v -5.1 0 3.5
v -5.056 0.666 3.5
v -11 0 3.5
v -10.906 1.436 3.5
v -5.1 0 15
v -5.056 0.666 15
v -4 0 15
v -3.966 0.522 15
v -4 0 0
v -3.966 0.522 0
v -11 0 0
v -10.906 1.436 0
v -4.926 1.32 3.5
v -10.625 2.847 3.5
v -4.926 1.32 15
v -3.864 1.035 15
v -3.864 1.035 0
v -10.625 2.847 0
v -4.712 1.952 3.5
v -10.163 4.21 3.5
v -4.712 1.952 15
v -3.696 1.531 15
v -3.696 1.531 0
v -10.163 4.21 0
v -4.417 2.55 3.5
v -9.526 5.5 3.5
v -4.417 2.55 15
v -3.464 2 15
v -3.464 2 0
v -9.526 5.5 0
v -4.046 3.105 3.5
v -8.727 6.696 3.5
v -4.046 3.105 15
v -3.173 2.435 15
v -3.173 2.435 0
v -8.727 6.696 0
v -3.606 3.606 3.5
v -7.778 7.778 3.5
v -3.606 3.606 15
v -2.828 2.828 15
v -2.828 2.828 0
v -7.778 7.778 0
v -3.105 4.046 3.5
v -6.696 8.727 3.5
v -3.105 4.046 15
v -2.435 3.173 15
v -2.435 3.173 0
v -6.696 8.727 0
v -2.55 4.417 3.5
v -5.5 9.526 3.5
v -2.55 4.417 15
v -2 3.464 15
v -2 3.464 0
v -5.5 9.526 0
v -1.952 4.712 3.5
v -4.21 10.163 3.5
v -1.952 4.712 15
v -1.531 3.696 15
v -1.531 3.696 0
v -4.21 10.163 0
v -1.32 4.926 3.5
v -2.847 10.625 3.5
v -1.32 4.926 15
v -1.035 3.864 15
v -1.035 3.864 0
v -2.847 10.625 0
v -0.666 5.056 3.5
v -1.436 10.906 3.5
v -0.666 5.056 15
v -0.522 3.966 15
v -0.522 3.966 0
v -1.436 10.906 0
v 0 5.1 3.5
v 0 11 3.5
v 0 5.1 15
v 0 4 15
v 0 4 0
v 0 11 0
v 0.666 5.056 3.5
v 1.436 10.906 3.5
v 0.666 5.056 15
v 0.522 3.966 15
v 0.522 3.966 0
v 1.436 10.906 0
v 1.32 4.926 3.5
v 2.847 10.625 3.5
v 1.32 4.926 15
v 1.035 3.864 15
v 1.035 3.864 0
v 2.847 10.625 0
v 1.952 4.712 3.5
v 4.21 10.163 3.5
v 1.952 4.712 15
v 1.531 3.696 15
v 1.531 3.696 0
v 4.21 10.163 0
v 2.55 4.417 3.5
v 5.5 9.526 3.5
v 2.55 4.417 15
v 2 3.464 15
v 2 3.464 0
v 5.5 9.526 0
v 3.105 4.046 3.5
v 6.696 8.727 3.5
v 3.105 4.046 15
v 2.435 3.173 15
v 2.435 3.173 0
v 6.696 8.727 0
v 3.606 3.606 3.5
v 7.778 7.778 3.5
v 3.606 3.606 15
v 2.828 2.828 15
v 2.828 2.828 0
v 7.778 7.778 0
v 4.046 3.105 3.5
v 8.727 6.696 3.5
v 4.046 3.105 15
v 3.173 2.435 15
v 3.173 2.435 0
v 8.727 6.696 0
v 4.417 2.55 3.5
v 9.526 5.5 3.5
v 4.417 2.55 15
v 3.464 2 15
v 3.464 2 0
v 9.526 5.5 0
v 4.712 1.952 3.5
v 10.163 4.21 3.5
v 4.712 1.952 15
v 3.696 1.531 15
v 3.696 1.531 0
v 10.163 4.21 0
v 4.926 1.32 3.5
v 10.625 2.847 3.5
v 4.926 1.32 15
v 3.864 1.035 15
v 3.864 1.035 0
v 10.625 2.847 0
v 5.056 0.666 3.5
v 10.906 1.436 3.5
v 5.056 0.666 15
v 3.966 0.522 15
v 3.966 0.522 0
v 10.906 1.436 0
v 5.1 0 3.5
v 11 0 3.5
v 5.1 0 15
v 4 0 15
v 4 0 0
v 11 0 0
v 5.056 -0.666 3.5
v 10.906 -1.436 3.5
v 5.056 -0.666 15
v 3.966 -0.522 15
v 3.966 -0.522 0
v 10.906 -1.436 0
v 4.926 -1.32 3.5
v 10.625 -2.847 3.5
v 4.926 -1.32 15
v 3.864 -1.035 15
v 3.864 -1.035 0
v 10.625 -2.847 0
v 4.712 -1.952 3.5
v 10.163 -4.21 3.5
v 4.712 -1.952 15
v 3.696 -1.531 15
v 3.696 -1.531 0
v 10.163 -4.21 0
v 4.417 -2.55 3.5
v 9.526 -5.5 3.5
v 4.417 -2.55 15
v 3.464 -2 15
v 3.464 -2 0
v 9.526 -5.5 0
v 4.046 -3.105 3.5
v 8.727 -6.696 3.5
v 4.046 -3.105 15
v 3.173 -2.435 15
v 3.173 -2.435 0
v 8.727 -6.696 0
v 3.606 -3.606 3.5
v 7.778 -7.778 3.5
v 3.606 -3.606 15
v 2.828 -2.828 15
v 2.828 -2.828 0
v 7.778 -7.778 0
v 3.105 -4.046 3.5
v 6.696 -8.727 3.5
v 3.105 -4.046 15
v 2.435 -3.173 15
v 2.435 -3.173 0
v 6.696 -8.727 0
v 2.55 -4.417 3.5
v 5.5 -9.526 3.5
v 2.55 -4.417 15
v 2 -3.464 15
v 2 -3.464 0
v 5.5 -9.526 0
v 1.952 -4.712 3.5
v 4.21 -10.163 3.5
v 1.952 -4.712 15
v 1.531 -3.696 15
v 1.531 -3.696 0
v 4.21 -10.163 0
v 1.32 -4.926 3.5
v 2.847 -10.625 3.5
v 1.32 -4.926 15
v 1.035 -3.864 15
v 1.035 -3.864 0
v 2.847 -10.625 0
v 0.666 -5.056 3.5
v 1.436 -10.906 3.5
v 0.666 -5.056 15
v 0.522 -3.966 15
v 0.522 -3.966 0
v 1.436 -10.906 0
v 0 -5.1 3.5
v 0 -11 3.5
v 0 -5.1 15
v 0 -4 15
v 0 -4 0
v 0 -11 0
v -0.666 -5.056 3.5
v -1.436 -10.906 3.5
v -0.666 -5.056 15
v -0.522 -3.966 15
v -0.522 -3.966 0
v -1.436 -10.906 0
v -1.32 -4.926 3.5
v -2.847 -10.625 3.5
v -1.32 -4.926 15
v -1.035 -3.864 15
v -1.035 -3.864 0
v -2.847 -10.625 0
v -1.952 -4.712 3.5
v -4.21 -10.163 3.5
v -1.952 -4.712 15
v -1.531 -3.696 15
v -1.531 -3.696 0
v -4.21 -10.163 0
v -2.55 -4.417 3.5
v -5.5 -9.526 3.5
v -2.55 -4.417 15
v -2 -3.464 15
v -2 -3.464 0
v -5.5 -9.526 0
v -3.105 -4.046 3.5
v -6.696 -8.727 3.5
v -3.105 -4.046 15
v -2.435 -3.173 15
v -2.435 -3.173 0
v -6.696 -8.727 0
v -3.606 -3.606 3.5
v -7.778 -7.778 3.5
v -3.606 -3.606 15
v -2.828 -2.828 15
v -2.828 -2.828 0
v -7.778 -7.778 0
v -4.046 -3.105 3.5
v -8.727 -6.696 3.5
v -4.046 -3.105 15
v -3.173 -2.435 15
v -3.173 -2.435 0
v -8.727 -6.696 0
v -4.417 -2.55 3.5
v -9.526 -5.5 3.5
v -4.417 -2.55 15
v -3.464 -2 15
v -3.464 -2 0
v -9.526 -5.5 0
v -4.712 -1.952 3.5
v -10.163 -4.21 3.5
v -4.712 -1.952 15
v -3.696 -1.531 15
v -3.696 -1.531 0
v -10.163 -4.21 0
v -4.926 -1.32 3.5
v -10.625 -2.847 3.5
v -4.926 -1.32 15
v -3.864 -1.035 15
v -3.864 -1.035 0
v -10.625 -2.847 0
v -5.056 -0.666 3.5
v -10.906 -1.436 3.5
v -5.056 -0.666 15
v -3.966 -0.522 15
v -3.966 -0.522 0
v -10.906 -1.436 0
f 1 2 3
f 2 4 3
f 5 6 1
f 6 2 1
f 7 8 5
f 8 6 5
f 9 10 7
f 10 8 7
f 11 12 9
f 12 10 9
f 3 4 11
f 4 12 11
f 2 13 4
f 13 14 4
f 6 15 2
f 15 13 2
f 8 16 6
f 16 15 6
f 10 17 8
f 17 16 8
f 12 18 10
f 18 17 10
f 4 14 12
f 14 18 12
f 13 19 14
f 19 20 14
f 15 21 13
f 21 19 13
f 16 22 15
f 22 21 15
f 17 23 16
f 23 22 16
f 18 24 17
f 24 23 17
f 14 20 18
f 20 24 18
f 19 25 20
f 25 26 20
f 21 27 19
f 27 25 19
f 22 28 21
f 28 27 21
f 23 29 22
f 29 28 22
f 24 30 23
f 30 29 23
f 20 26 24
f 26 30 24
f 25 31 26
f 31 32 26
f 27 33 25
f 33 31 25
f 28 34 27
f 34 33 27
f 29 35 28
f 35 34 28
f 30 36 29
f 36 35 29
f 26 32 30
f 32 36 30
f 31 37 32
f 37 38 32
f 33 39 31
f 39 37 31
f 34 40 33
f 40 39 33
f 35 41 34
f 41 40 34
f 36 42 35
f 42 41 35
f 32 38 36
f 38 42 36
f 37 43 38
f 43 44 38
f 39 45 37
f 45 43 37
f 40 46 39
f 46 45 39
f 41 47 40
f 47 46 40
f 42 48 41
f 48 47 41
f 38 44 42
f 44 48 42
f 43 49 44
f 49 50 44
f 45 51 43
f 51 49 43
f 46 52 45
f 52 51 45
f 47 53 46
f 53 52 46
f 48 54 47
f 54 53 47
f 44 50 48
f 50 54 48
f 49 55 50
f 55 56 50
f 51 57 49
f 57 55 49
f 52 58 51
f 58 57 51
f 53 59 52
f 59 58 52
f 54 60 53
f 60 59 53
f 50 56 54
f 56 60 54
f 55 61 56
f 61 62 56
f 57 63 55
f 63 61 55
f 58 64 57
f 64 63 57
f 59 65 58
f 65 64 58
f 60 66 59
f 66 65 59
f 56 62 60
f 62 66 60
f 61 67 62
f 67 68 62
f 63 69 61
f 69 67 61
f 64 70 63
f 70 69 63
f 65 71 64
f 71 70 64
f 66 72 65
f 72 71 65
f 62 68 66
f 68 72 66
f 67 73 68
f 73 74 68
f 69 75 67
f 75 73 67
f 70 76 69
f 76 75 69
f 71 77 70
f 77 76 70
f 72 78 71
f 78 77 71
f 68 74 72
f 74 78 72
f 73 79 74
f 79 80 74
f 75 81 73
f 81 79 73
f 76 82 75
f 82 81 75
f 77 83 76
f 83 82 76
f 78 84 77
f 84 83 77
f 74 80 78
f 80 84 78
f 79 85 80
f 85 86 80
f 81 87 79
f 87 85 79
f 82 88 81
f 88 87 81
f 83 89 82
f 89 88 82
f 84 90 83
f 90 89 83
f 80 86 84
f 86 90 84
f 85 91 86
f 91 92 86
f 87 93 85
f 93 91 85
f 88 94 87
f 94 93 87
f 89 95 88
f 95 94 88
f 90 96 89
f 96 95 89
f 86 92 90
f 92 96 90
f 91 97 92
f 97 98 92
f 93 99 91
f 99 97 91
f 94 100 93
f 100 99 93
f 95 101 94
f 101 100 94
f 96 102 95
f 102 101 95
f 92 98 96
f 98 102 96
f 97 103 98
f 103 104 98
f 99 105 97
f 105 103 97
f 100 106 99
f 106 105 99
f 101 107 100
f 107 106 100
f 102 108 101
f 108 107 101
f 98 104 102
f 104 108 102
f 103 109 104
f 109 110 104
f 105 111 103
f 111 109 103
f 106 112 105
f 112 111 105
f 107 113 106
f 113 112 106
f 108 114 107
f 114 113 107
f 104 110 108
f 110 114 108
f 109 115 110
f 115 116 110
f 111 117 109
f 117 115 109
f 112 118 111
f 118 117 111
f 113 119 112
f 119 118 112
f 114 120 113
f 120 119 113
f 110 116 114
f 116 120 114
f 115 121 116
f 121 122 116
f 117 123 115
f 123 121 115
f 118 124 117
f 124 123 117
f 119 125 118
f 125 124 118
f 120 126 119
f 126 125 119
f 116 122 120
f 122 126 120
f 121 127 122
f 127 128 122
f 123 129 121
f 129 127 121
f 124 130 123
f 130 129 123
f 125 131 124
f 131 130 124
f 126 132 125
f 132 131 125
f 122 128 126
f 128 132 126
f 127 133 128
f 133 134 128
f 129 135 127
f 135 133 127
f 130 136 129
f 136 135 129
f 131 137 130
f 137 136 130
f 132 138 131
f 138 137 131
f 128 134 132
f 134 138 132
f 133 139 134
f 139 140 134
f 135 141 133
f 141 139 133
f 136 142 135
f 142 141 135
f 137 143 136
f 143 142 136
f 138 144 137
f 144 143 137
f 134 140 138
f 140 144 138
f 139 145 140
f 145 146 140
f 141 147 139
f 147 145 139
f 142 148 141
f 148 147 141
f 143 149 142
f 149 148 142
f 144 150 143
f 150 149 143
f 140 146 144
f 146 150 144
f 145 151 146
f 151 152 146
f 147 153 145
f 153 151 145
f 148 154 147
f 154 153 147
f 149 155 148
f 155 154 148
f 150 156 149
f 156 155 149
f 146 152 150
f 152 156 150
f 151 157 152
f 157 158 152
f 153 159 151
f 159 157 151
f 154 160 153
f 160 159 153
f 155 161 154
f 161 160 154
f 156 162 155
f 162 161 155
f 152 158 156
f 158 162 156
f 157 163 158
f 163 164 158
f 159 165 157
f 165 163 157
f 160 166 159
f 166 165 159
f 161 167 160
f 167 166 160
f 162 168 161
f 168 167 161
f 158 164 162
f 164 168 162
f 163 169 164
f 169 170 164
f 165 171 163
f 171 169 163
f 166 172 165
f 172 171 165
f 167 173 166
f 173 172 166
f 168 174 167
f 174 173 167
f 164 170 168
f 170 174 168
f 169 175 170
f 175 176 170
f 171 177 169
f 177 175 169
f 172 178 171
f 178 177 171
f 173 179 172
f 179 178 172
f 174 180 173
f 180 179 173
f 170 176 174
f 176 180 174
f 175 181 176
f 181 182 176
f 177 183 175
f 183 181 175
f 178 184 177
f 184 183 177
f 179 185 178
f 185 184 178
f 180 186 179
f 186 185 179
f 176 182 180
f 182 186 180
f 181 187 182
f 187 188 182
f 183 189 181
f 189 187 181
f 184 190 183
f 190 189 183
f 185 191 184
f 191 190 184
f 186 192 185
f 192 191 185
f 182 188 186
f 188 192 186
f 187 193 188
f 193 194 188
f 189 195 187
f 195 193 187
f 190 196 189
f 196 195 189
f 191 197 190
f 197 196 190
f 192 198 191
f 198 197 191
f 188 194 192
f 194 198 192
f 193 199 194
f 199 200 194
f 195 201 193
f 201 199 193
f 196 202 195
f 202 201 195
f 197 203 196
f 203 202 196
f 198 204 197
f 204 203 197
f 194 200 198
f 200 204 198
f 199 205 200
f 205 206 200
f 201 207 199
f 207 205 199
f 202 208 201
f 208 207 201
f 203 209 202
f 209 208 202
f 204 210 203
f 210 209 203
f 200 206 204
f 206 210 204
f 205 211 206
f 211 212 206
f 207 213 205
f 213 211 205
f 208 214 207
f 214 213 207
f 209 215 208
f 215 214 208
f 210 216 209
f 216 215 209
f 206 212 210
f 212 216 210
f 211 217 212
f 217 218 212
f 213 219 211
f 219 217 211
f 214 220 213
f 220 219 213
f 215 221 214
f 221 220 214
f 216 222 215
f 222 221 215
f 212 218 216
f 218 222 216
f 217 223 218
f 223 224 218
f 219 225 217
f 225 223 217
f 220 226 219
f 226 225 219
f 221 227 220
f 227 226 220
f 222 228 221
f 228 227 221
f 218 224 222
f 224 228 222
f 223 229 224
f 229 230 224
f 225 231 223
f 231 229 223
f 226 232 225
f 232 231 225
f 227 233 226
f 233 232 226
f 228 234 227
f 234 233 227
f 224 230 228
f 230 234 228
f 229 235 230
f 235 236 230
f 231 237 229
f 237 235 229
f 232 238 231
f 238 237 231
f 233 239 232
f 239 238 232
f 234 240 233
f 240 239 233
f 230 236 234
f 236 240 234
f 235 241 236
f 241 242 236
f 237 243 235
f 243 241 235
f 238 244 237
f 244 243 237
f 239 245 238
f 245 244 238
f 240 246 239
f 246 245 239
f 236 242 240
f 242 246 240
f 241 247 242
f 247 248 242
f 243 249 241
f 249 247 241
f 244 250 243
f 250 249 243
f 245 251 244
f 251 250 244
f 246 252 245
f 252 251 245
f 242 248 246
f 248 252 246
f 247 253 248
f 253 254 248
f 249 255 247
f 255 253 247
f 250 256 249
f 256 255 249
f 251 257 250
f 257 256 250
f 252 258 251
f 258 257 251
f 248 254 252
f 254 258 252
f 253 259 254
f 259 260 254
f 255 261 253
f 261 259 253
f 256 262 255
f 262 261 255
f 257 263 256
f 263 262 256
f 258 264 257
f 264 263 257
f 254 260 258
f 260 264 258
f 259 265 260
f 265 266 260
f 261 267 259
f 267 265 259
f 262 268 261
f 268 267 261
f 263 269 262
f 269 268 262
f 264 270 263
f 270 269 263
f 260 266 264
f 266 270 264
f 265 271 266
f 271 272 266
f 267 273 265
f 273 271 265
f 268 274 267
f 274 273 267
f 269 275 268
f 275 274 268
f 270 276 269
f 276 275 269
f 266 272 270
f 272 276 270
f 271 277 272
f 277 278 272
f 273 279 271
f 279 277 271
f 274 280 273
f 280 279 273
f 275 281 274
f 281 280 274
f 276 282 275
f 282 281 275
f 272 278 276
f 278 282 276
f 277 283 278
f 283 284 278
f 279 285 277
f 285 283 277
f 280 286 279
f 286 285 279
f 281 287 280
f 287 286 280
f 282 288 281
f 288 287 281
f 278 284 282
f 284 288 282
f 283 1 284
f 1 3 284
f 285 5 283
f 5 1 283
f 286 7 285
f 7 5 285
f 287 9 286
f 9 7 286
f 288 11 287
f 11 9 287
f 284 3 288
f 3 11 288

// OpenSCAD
// file: ../config.scad
// SCARA 로봇 공통 사양(specification) — 모든 부품 파일에서 include해 사용한다.

$fn = 48;

// ── 공차(tolerance) ──
print_clearance = 0.2;   // FDM 출력 끼워맞춤(fit) 여유 — 압입(press-fit) 자리 제외
eps             = 1/128; // 미세 겹침(epsilon) — 접하는 솔리드를 살짝 겹쳐 동일면(coincident face) z-파이팅 방지

// ── FDM 출력 사양(print specification) ──
fdm_layer_h       = 0.28;   // 레이어 높이(layer height) — 슬라이서(slicer) 설정값과 일치시킨다.
fdm_shoulder_layers = 6;   // 숄더(shoulder) 최소 레이어 수 — FDM 최소 구조 벽(0.4mm 노즐 3겹 ~1.2mm) 기준 하한값.

// ── 레이아웃(layout) ──
// layout_margin — 플레이트 위 부품 배치 공통 여백(margin). 부품 외곽선에서
// 사방으로 주는 값 → 부품끼리는 2*margin 이격, 외곽 가장자리도 margin 확보.
layout_margin = 4;

// ── 시트 형상(seat geometry) ──
// seat_shoulder_t — fdm_layer_h · fdm_shoulder_layers 파생. 슬라이서 설정 변경 시 자동 연동.
seat_shoulder_t = fdm_layer_h * fdm_shoulder_layers;
// main file
/*
 * lead_nuts.scad - 플랜지 리드넛(flanged lead nut) 기성품(vitamin)
 *
 * T8 리드스크루(lead screw)의 회전을 직선 이송(linear feed)으로 바꾸는
 * 황동(brass) 플랜지 리드넛 시각화용 모델(보어 T8 / 몸체 ⌀10.2 /
 * 플랜지 ⌀22 x 3.5 / 총높이 15).
 *
 * Z 브레이크포인트(Z breakpoint) 최적화: 리드넛은 회전 대칭(rotationally
 * symmetric)이라 플랜지(flange)·몸체(body)·보어(bore)를 동시에 그리는
 * 환형(annular) 단면 한 개의 단일 rotate_extrude로 만든다 — union·
 * difference 없음. (플랜지 볼트홀(bolt hole)은 단일 회전체 유지를 위해
 * 생략한다.)
 *
 * 좌표계: 축(axis) = Z, 플랜지 바닥(flange base) = z=0.
 */

include <../config.scad>

/* --- 색상(cosmetic) --- */
c_brass		= [0.78, 0.62, 0.32];	/* 황동(brass) */

/*
 * 플랜지 리드넛 — bore_d(보어) x body_d(몸체) x flange_d(플랜지) x
 * flange_t(플랜지 두께) x height(총 높이). 플랜지 바닥(z=0)에서 시작해
 * 플랜지 외경으로 두께만큼 올린 뒤 몸체 외경으로 좁혀 끝까지 세운다.
 * 보어(bore)는 환형 단면의 안쪽 모서리로 한 번에 표현한다.
 */
module lead_nut(bore_d, body_d, flange_d, flange_t, height)
{
	br = bore_d / 2;	/* 보어 반지름 — T8 리드스크루 통과 */
	yr = body_d / 2;	/* 몸체(body) 반지름 */
	fr = flange_d / 2;	/* 플랜지(flange) 반지름 — 마운팅 면 */

	/* 환형 단면 단일 회전체 — 플랜지·몸체·보어 동시 표현 */
	color(c_brass)
		rotate_extrude(convexity = 4)
			polygon([[br, 0],		/* 보어 바닥 */
				 [fr, 0],		/* 플랜지 바깥 바닥 */
				 [fr, flange_t],	/* 플랜지 어깨(shoulder) */
				 [yr, flange_t],	/* 몸체로 좁힘 */
				 [yr, height],		/* 몸체 끝 외경 */
				 [br, height]]);	/* 보어 상단 */
}

/* --- 표준 변형(convenience) --- */
module t8_lead_nut() { lead_nut(8, 10.2, 22, 3.5, 15); }	/* T8 황동 */

t8_lead_nut();
